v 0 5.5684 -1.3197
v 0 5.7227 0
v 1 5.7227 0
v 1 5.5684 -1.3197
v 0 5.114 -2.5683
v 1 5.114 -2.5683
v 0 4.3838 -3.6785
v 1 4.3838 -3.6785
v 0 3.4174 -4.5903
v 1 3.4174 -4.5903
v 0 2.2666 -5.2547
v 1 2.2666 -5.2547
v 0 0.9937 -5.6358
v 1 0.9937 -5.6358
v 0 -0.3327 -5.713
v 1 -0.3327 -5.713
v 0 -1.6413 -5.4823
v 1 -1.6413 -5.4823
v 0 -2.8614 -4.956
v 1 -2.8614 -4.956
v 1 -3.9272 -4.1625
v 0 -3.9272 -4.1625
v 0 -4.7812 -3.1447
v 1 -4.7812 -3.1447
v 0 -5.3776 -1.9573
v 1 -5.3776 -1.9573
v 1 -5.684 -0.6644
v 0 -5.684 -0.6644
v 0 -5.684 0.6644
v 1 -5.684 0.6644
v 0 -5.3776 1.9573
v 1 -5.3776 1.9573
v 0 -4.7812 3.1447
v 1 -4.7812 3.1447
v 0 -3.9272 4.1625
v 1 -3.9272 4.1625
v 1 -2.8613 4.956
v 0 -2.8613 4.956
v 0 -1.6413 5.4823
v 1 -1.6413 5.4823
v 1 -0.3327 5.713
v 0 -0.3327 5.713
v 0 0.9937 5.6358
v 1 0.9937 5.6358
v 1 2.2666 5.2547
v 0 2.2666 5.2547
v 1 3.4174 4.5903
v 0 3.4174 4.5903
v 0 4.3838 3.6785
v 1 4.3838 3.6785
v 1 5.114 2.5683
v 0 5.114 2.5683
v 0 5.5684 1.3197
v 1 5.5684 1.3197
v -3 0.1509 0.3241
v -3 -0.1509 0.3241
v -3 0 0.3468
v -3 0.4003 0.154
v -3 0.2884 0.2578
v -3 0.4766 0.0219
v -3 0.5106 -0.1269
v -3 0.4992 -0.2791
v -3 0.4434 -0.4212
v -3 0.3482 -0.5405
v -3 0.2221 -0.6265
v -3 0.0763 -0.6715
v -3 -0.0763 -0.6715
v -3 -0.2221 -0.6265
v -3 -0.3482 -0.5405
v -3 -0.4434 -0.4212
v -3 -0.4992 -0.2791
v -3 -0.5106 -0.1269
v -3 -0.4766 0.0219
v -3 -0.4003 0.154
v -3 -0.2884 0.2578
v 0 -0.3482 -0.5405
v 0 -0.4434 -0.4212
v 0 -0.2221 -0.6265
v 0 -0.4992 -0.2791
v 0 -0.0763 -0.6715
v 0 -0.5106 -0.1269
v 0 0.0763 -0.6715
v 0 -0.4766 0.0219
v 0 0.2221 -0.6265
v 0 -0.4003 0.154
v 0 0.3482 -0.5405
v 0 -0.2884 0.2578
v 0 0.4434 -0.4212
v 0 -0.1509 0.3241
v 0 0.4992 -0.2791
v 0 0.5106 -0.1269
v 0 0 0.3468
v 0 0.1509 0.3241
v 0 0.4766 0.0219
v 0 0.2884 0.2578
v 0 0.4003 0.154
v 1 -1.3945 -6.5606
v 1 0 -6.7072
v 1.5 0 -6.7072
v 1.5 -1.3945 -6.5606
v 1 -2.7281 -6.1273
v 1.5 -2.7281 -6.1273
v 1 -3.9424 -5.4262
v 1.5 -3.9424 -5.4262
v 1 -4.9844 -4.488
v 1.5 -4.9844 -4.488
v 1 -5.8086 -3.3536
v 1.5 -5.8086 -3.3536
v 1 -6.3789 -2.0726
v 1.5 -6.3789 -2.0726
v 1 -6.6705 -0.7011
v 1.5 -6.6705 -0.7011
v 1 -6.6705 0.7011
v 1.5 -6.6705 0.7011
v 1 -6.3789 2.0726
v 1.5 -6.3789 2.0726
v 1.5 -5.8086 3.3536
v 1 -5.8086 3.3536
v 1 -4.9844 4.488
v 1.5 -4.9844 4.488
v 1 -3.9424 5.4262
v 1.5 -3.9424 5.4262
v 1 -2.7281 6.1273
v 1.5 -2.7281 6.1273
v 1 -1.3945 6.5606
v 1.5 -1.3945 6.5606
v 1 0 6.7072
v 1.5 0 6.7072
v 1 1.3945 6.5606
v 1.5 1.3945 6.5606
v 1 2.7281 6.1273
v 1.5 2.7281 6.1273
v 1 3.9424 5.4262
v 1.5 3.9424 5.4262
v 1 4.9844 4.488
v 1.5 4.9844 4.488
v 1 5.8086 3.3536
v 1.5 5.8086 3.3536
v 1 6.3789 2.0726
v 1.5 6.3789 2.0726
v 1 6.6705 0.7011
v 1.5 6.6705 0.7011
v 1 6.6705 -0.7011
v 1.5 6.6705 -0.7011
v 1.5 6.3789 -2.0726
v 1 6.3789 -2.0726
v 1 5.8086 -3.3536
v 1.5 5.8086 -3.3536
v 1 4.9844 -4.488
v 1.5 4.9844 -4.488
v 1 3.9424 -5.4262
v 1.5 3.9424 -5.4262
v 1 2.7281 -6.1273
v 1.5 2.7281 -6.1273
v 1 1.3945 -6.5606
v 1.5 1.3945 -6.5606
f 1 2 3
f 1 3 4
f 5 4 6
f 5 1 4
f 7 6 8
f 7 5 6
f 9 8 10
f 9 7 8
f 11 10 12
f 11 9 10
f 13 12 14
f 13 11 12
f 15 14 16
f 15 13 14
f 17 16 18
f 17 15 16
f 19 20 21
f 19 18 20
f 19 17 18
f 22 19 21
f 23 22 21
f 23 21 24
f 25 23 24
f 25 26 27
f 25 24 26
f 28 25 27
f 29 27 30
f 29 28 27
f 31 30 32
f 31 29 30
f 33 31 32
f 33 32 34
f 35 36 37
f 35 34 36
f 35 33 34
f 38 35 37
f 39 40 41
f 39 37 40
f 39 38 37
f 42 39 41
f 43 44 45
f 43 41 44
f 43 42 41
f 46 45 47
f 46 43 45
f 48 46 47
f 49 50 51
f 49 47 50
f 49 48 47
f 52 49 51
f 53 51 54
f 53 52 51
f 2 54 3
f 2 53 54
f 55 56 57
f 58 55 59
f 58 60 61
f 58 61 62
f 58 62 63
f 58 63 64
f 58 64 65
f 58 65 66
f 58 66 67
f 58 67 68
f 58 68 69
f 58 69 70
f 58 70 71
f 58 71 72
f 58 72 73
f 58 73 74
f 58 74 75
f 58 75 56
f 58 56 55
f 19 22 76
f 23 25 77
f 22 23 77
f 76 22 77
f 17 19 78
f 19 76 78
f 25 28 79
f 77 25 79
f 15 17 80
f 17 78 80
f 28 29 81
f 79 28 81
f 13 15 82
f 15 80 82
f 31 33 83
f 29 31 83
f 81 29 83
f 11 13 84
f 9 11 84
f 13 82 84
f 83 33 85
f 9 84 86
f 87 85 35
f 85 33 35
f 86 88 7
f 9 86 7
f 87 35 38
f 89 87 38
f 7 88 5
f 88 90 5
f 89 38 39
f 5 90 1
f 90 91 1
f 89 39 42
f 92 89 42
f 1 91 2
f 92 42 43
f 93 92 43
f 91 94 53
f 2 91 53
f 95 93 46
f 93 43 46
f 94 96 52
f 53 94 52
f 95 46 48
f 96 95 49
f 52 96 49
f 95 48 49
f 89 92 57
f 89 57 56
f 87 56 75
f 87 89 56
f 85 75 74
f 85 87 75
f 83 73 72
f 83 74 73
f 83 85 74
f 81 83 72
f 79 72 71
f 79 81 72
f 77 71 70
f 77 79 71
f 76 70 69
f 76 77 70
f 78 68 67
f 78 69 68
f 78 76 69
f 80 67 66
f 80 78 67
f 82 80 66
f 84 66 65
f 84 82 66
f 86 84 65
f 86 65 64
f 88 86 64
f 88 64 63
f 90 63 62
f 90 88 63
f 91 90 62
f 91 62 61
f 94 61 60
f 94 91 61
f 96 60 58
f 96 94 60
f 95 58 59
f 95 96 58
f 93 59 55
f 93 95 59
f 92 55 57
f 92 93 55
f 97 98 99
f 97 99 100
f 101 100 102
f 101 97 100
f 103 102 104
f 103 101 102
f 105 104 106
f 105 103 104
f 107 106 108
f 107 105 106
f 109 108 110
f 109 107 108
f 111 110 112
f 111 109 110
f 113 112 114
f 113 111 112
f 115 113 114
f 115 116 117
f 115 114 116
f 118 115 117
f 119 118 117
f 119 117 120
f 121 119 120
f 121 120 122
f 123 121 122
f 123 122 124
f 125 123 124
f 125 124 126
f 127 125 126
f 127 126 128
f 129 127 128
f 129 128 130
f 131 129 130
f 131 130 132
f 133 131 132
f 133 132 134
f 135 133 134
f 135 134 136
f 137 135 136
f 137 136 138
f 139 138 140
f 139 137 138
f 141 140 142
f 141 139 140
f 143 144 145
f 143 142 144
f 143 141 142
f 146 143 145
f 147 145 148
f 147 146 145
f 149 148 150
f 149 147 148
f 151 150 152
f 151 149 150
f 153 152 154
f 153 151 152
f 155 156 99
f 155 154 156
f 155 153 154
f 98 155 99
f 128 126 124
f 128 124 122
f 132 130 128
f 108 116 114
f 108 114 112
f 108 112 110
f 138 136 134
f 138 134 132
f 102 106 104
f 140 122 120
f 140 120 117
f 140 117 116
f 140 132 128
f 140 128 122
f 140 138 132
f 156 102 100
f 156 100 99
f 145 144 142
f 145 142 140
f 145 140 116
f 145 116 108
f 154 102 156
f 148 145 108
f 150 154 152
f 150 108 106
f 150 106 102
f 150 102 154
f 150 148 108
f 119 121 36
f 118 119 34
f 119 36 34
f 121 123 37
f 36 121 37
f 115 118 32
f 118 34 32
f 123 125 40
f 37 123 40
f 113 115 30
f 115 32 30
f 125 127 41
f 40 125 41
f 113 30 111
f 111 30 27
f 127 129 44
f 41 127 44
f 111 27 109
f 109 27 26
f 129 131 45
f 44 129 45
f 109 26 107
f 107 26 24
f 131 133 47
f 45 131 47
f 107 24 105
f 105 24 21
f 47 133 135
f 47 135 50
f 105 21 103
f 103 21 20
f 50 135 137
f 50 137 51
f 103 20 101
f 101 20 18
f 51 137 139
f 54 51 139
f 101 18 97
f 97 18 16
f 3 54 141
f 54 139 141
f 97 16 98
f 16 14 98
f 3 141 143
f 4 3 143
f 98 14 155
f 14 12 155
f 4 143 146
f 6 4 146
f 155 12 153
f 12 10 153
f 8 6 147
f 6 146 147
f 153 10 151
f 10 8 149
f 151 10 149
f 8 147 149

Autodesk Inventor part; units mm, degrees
ref_plane "YZ Plane" through (0, 0, 0) normal (1, 0, 0) x (0, 1, 0)
ref_plane "XZ Plane" through (0, 0, 0) normal (0, 1, 0) x (-1, 0, 0)
ref_plane "XY Plane" through (0, 0, 0) normal (0, 0, 1) x (1, 0, 0)
sketch "Sketch1" plane through (0, 0, 0) normal (1, 0, 0) x (0, 1, 0)
  circle A0 centre (0, 0) radius 5.7227
extrude "Extrusion1" add sketch "Sketch1" along normal blind 1
sketch "Sketch2" plane through (1, 0, 0) normal (1, 0, 0) x (0, 0, -1)
  circle A0 centre (0, 0) radius 6.7072
extrude "Extrusion2" add sketch "Sketch2" along normal blind 0.5
sketch "Sketch3" plane through (0, 0, 0) normal (-1, 0, 0) x (0, 0, 1)
  circle A0 centre (-0.1652, 0) radius 0.512
  point P0 (0, 0)
extrude "Extrusion3" add sketch "Sketch3" along normal blind 3
